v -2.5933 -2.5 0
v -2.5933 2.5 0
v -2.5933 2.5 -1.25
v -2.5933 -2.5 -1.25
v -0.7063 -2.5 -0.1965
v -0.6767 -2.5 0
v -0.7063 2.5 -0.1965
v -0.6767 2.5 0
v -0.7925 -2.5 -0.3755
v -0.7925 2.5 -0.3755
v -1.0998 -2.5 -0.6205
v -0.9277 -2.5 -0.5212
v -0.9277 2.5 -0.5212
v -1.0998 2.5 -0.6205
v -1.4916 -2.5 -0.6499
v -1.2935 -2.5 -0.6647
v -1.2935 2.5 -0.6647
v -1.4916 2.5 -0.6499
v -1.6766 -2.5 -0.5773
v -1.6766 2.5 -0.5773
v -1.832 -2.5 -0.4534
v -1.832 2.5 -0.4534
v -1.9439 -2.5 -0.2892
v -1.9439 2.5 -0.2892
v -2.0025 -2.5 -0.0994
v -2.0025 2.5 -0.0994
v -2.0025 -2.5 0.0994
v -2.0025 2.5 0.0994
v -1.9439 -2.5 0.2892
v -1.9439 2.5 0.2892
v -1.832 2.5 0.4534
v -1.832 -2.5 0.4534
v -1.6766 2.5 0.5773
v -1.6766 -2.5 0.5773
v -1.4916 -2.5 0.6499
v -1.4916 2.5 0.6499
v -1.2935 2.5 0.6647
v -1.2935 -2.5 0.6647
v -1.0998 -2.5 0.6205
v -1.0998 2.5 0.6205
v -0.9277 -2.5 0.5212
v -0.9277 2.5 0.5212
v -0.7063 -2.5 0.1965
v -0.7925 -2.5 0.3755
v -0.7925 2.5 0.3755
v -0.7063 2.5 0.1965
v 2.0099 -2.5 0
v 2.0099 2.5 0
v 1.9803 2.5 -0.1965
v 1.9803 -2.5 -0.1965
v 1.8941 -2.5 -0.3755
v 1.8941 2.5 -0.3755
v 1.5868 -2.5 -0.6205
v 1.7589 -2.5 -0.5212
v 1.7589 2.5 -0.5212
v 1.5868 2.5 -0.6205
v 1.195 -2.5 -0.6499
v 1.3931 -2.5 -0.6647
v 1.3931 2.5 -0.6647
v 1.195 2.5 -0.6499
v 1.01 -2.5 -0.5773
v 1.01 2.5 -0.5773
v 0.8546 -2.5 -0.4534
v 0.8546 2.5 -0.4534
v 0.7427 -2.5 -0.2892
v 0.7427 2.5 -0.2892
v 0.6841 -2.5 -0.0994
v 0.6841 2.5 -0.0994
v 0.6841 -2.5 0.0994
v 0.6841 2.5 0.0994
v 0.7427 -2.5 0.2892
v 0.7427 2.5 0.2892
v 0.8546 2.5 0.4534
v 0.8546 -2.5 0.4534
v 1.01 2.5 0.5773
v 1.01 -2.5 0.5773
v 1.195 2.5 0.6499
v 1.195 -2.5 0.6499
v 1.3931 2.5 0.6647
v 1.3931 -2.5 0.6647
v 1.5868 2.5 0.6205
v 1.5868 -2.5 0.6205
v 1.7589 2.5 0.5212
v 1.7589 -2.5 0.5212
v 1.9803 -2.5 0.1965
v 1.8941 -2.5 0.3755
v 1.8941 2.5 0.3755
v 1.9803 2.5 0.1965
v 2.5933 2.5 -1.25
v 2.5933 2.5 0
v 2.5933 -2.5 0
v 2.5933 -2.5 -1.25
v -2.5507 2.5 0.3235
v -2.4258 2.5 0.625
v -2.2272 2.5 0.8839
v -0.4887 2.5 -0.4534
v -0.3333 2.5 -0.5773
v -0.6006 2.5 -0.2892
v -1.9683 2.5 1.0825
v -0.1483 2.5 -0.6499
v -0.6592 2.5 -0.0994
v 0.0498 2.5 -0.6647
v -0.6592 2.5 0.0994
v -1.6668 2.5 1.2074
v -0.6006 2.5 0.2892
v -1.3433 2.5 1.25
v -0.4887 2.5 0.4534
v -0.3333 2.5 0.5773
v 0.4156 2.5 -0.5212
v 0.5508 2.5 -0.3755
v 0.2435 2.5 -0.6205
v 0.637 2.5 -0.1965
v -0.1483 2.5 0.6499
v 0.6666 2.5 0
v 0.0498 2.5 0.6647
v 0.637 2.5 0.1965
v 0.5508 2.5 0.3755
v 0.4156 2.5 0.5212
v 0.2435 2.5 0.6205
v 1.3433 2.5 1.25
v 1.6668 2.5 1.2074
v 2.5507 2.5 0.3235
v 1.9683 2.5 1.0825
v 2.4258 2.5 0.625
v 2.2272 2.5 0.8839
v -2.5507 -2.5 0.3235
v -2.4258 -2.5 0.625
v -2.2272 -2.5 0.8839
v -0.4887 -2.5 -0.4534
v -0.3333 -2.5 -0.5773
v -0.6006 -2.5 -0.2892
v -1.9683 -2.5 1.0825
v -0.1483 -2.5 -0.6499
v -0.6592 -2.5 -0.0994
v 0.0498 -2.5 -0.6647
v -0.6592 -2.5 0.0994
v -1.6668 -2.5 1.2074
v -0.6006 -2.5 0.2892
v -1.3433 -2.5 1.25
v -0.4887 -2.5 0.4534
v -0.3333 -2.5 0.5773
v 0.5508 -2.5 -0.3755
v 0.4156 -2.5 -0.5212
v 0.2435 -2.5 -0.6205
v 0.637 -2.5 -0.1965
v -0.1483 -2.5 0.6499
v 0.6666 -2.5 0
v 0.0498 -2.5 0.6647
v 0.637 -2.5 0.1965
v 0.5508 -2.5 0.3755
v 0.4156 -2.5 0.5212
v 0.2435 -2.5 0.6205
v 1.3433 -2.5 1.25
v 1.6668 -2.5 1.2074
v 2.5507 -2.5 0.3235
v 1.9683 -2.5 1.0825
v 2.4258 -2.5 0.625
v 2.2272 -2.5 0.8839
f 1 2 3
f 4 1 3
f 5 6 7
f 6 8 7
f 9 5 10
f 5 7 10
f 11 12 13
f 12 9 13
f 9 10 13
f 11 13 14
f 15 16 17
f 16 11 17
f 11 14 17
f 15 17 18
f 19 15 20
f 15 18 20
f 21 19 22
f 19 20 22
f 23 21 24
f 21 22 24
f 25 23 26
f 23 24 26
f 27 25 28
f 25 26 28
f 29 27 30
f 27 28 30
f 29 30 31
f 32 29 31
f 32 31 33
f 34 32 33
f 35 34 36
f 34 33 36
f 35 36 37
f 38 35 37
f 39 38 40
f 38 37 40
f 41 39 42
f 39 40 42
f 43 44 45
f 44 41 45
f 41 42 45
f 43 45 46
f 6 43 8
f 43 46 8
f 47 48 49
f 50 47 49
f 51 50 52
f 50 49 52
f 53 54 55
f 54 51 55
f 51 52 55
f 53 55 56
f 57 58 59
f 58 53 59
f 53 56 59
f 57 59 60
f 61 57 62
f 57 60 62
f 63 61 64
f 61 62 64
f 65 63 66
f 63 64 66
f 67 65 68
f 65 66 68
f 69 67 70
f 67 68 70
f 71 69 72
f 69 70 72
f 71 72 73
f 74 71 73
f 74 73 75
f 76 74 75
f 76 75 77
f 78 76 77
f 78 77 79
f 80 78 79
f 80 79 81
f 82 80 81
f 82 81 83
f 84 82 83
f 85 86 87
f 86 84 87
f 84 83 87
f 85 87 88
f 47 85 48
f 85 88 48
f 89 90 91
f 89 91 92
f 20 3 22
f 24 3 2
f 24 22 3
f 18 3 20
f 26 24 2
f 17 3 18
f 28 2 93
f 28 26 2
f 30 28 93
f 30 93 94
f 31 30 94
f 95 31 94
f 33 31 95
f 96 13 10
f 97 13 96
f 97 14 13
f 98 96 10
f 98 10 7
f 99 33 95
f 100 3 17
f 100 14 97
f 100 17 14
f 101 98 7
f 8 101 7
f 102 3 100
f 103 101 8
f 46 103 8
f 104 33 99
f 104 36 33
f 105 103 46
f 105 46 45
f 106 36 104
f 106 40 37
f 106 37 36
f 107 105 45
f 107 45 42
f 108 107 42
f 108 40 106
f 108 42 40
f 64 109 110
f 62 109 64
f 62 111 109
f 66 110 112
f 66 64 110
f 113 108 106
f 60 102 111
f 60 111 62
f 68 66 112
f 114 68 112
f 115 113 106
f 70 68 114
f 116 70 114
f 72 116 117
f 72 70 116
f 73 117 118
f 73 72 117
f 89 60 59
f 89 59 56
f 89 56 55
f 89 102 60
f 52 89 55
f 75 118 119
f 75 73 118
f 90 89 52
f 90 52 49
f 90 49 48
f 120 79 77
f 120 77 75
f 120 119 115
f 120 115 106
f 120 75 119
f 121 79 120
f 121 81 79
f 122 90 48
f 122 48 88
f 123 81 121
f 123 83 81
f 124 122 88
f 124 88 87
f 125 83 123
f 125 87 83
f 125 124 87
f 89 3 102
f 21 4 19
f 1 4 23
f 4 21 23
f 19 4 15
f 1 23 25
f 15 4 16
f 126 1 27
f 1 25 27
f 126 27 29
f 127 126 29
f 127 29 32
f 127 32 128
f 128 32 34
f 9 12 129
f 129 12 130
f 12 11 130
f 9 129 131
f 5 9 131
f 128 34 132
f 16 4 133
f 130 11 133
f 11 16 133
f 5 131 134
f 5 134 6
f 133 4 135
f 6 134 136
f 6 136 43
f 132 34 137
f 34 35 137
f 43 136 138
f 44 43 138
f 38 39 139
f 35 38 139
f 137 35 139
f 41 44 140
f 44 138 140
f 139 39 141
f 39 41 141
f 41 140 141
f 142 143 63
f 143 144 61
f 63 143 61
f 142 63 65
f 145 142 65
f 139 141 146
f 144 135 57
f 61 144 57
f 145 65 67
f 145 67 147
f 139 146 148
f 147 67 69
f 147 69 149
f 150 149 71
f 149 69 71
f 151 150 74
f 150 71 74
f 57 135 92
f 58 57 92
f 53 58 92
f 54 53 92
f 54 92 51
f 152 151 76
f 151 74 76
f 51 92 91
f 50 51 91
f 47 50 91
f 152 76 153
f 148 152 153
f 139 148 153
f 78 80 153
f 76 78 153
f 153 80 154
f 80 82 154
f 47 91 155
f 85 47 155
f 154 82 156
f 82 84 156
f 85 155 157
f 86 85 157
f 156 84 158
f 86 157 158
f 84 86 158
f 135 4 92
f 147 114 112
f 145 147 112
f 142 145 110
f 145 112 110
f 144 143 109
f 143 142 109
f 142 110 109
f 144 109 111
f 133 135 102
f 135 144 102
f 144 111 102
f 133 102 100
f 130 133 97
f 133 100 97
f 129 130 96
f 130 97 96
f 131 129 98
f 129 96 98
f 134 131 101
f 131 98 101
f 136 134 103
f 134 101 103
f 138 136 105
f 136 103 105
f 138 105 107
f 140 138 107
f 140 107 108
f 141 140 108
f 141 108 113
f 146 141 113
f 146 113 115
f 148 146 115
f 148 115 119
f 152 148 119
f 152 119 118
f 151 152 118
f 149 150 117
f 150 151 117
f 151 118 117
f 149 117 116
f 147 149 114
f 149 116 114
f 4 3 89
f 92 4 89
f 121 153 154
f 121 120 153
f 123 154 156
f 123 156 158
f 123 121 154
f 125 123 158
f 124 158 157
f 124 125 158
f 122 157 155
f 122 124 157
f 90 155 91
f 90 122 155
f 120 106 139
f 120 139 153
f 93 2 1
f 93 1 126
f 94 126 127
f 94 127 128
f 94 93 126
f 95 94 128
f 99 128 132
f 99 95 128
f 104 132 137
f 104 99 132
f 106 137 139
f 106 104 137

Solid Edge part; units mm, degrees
sketch "Sketch1" plane through (0, 0, 0) normal (0, -1, 0) x (1, 0, 0)
  circle A0 centre (0, 0) radius 0.6666
  circle A1 centre (-1.3433, 0) radius 0.6666
  circle A2 centre (1.3433, 0) radius 0.6666
  line L0 (-1.3433, 1.25) -> (1.3433, 1.25)
  line L1 (2.5933, 0) -> (2.5933, -1.25)
  line L2 (-2.5933, -1.25) -> (2.5933, -1.25)
  line L3 (-2.5933, 0) -> (-2.5933, -1.25)
  arc A3 (-2.5933, 0) -> (-1.3433, 1.25) centre (-1.3433, 0) cw
  arc A4 (1.3433, 1.25) -> (2.5933, 0) centre (1.3433, 0) cw
extrude "Protrusion1" add sketch "Sketch1" along normal mid plane 5
